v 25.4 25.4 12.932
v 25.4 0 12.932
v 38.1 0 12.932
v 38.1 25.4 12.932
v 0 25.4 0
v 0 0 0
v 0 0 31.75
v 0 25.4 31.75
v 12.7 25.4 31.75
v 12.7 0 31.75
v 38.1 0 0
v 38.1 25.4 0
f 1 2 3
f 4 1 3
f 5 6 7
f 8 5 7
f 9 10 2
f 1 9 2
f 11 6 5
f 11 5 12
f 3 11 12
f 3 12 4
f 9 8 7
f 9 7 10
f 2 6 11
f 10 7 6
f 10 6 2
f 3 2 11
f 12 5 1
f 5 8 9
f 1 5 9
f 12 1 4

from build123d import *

# Parameters (mm, degrees)
F0_W     = 38.1
F0_H     = 31.75
F1_DEPTH = 25.4
F3_DEPTH = 25.4


with BuildPart() as f1:
    # F0 (on Front) → F1 (new body)
    with BuildSketch(Plane.XZ):
        with Locations((19.05, 15.875)):
            Rectangle(F0_W, F0_H)
    extrude(amount=-F1_DEPTH)

    # F2 (on face) → F3 (cut)
    with BuildSketch(Plane.XZ):
        Polygon((25.4, 12.93213), (38.1, 12.93213), (38.1, 31.75), (12.7, 31.75), align=None)
    extrude(amount=-F3_DEPTH, mode=Mode.SUBTRACT)


solid = f1.part
